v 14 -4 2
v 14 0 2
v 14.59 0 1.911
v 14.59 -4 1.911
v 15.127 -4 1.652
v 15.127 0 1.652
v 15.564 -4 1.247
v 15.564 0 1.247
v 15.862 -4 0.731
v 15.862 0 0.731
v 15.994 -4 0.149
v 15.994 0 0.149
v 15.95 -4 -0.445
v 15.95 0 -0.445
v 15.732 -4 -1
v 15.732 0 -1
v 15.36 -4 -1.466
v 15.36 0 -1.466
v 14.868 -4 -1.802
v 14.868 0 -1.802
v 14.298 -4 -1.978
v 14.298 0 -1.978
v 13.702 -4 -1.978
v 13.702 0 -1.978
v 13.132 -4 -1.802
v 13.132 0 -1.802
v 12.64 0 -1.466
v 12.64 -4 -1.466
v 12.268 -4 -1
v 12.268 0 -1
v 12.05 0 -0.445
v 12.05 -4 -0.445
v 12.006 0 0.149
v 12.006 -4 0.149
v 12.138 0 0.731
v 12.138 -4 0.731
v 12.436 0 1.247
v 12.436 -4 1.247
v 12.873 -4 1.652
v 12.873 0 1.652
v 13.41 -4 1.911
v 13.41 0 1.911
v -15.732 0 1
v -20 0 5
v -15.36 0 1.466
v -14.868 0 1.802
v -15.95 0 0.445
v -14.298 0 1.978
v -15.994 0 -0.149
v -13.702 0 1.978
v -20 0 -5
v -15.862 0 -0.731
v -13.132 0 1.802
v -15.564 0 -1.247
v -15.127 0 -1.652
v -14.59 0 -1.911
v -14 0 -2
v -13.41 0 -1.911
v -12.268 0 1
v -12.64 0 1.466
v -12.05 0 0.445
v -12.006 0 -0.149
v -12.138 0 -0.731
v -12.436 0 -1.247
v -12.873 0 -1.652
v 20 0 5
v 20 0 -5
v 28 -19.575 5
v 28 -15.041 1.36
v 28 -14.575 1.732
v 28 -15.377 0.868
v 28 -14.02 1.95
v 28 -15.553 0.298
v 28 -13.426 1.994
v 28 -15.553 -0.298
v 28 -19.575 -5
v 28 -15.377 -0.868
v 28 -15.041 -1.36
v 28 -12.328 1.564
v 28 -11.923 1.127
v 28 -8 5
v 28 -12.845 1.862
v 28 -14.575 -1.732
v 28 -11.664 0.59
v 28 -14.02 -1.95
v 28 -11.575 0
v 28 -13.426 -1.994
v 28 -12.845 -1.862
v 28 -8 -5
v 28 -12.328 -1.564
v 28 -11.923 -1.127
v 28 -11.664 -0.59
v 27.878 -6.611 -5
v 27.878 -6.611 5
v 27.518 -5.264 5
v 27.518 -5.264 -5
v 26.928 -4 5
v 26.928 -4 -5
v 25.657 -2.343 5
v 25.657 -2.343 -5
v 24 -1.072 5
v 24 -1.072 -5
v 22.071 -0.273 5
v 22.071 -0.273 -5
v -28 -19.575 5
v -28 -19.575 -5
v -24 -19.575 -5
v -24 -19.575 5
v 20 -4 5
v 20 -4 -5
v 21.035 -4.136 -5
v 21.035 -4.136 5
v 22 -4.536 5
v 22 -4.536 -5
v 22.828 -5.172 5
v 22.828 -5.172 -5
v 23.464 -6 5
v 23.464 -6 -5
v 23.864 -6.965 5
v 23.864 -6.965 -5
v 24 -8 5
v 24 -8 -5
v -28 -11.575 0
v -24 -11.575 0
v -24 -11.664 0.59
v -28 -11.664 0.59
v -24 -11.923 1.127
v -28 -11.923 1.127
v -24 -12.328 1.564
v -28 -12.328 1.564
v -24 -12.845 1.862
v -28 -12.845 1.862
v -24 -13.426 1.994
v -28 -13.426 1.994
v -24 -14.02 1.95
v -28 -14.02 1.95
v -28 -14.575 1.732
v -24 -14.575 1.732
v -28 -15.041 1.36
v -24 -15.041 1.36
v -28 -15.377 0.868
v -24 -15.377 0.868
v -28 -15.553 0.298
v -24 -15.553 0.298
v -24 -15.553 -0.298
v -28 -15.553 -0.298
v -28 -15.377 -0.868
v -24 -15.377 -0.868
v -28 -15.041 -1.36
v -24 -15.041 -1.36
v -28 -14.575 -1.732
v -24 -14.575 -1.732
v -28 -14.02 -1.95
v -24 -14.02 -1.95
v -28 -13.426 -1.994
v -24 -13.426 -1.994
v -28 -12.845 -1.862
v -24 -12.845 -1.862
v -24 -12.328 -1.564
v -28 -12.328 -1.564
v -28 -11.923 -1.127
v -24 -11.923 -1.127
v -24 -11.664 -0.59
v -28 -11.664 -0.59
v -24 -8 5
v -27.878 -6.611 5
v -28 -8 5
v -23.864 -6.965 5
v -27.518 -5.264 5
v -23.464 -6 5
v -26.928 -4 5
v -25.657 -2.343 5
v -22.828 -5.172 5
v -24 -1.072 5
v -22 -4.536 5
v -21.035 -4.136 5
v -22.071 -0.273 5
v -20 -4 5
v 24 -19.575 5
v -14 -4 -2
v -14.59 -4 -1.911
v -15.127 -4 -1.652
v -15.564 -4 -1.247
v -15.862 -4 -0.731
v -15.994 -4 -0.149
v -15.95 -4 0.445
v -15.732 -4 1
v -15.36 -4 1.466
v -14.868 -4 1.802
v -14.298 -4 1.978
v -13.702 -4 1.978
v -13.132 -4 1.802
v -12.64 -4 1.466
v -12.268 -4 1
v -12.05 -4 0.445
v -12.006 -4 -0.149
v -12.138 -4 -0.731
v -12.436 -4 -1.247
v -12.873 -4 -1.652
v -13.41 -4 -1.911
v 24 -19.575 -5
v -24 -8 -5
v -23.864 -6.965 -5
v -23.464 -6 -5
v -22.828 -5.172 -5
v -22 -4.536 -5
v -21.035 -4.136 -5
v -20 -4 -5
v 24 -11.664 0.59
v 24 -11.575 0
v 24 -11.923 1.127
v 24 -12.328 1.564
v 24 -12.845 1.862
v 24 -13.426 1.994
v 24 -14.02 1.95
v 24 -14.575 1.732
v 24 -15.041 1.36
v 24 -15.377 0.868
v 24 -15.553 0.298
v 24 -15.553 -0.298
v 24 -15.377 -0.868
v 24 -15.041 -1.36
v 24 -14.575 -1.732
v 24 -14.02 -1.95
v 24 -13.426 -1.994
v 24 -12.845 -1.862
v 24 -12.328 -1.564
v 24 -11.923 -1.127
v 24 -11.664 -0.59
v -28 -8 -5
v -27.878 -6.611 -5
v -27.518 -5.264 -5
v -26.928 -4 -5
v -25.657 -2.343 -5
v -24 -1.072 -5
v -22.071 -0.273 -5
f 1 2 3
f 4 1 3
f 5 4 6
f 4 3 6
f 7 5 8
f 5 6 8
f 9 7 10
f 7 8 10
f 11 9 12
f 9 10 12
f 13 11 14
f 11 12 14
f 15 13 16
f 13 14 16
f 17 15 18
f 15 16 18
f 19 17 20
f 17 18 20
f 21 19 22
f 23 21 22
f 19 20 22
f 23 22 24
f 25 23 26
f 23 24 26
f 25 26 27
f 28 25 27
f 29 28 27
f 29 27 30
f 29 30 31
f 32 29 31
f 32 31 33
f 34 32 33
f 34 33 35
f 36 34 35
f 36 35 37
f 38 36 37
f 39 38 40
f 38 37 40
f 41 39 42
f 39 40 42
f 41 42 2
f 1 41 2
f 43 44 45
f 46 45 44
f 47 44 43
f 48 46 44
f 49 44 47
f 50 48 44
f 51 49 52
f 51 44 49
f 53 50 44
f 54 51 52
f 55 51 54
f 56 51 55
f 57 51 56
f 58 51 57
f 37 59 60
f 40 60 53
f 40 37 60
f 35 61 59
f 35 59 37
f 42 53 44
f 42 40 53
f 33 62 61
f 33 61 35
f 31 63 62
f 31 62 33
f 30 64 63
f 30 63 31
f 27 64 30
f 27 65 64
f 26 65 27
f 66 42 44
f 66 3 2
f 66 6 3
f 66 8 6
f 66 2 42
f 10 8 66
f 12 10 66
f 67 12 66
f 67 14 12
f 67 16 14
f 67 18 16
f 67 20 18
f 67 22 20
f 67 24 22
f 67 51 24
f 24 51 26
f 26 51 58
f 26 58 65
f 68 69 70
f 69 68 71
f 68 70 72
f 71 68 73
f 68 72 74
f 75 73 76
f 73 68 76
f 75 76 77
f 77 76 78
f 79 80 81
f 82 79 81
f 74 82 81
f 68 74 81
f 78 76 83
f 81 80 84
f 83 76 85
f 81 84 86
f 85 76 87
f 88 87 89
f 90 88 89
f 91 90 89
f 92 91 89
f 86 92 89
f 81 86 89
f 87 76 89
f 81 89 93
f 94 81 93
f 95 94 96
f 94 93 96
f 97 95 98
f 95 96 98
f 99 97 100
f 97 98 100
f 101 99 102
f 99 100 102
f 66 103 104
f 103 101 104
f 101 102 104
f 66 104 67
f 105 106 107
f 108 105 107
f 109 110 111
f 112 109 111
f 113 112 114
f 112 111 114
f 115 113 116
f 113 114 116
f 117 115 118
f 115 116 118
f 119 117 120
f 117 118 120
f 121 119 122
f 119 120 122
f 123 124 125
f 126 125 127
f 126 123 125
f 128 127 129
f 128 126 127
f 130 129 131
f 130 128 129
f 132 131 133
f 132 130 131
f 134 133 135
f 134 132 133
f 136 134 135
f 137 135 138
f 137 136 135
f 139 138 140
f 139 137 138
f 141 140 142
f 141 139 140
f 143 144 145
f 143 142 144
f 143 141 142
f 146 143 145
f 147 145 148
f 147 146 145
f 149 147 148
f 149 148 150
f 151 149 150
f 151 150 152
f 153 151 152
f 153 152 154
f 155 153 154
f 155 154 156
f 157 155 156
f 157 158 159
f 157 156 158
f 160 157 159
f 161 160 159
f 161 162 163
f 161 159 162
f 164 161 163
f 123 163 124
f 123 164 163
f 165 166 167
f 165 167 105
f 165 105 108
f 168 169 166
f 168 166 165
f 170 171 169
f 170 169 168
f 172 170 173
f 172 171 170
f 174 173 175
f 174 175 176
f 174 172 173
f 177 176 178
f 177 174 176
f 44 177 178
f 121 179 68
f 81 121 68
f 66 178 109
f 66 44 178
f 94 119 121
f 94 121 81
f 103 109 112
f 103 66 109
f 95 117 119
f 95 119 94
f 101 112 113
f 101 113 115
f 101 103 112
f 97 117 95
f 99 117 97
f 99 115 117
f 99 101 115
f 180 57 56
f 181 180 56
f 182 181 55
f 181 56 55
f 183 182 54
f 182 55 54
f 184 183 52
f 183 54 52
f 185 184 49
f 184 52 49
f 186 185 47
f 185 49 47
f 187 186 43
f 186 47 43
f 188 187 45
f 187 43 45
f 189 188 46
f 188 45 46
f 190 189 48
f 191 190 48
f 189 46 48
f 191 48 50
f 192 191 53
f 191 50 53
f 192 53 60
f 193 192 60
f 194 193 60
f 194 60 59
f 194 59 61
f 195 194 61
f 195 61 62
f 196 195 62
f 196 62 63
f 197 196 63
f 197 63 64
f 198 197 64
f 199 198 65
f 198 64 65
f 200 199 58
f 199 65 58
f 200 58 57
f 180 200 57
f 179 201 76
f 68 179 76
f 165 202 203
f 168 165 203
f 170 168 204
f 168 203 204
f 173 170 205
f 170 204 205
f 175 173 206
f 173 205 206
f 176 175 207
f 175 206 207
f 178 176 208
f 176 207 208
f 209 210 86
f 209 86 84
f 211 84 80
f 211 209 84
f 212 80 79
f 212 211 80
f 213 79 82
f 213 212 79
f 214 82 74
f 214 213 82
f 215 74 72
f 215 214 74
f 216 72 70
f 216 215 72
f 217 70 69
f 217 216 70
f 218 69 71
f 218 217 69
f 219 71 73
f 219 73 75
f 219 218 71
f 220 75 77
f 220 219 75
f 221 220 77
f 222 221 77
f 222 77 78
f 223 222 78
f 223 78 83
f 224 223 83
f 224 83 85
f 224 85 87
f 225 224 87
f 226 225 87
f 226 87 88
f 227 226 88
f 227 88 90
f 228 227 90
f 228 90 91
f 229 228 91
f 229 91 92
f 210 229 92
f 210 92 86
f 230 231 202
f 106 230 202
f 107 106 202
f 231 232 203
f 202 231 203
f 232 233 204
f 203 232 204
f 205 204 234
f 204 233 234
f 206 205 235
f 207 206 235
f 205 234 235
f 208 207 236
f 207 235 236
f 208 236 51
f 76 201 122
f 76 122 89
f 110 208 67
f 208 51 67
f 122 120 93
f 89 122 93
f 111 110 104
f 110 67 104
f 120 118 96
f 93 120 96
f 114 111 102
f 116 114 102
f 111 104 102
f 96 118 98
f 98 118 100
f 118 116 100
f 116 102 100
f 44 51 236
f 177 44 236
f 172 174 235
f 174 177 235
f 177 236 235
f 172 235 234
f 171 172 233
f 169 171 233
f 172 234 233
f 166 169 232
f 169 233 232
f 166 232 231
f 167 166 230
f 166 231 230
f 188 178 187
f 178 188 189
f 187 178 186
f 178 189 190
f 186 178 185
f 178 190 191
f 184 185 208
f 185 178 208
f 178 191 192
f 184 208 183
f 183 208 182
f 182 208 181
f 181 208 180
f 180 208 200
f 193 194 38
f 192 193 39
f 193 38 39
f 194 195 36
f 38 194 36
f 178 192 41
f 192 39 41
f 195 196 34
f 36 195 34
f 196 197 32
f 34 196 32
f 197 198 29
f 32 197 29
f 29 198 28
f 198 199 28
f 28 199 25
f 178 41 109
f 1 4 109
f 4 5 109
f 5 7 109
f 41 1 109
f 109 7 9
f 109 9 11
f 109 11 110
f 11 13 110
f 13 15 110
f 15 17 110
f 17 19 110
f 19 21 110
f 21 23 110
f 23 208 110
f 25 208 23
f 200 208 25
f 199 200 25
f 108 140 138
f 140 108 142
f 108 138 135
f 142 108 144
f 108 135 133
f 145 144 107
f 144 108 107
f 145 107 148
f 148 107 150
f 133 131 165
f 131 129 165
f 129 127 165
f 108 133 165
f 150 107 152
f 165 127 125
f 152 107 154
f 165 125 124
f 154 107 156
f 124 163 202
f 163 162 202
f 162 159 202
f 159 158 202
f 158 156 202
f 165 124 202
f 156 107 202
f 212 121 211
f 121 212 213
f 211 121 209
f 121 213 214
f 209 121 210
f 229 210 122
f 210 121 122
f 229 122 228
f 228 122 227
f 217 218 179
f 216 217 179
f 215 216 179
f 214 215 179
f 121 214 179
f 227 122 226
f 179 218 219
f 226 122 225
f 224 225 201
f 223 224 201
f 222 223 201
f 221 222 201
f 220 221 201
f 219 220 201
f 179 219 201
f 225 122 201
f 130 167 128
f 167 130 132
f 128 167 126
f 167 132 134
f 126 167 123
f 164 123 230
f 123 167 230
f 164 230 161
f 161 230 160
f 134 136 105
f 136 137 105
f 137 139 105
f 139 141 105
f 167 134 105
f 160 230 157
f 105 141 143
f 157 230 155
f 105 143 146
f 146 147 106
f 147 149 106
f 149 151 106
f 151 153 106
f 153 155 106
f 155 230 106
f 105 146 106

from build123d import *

# Parameters (mm, degrees)
SKETCH1_W                  = 82
SKETCH1_H                  = 10
SKETCH1_R                  = 2
BASE_FLANGE1_DEPTH         = 4
SKETCHED_START             = -5
SKETCHED_BEND1_DEPTH       = 10
SKETCHED_BEND1_2_DEPTH     = 2.9999999
SKETCHED_START_2           = 2.0000001
SKETCHED_BEND1_3_DEPTH     = 2.9999999
SKETCHED_START_3           = -2.0000001
SKETCHED_BEND1_4_DEPTH     = 4.0000002
SKETCHED_START_4           = -28
SKETCHED_BEND1_5_OUTLINE_R = 2
SKETCHED_BEND1_5_DEPTH     = 56


with BuildPart() as part:
    # Base-Flange1: sheet metal written as solids
    # Sketch1 → Base-Flange1 (new body)
    with BuildSketch(Plane(origin=(0, 0, 0), x_dir=(1, 0, 0), z_dir=(0, 1, 0))):
        Rectangle(SKETCH1_W, SKETCH1_H)
        with Locations(Location((14, 0, 0), (0, 0, 270))):
            Circle(SKETCH1_R, mode=Mode.SUBTRACT)
        with Locations(Location((35, 0, 0), (0, 0, 270))):
            Circle(SKETCH1_R, mode=Mode.SUBTRACT)
        with Locations(Location((-35, 0, 0), (0, 0, 90))):
            Circle(SKETCH1_R, mode=Mode.SUBTRACT)
        with Locations(Location((-14, 0, 0), (0, 0, 90))):
            Circle(SKETCH1_R, mode=Mode.SUBTRACT)
    extrude(amount=-BASE_FLANGE1_DEPTH)

    # Sketched Bend1: read off the stored shape, not the designer's step
    # Sketched Bend1 outline → Sketched Bend1 (cut)
    with BuildSketch(Plane.XY.offset(SKETCHED_START)):
        with BuildLine():
            ThreePointArc((20, 0), (23.999999999, -1.07179677), (26.92820323, -4))
            Line((26.92820323, -4), (41, -4))
            Line((41, -4), (41, 0))
            Line((41, 0), (20, 0))
        make_face()
        with BuildLine():
            Line((-41, -4), (-26.92820323, -4))
            ThreePointArc((-26.92820323, -4), (-23.999999999, -1.07179677), (-20, 0))
            Line((-20, 0), (-41, 0))
            Line((-41, 0), (-41, -4))
        make_face()
    extrude(amount=SKETCHED_BEND1_DEPTH, mode=Mode.SUBTRACT)

    # Sketched Bend1 2 outline → Sketched Bend1 2 (add)
    with BuildSketch(Plane.XY.offset(SKETCHED_START)):
        with BuildLine():
            ThreePointArc((20, -4), (22.828427125, -5.171572875), (24, -8))
            Line((24, -8), (24, -19.575222039))
            Line((24, -19.575222039), (28, -19.575222039))
            Line((28, -19.575222039), (28, -8))
            ThreePointArc((28, -8), (27.72740661, -5.929447639), (26.92820323, -4))
            Line((26.92820323, -4), (20, -4))
        make_face()
        with BuildLine():
            ThreePointArc((-24, -8), (-22.828427125, -5.171572875), (-20, -4))
            Line((-20, -4), (-26.92820323, -4))
            ThreePointArc((-26.92820323, -4), (-27.72740661, -5.929447639), (-28, -8))
            Line((-28, -8), (-28, -19.575222039))
            Line((-28, -19.575222039), (-24, -19.575222039))
            Line((-24, -19.575222039), (-24, -8))
        make_face()
    extrude(amount=SKETCHED_BEND1_2_DEPTH)

    # Sketched Bend1 3 outline → Sketched Bend1 3 (add)
    with BuildSketch(Plane.XY.offset(SKETCHED_START_2)):
        with BuildLine():
            ThreePointArc((20, -4), (22.828427125, -5.171572875), (24, -8))
            Line((24, -8), (24, -19.575222039))
            Line((24, -19.575222039), (28, -19.575222039))
            Line((28, -19.575222039), (28, -8))
            ThreePointArc((28, -8), (27.72740661, -5.929447639), (26.92820323, -4))
            Line((26.92820323, -4), (20, -4))
        make_face()
        with BuildLine():
            ThreePointArc((-24, -8), (-22.828427125, -5.171572875), (-20, -4))
            Line((-20, -4), (-26.92820323, -4))
            ThreePointArc((-26.92820323, -4), (-27.72740661, -5.929447639), (-28, -8))
            Line((-28, -8), (-28, -19.575222039))
            Line((-28, -19.575222039), (-24, -19.575222039))
            Line((-24, -19.575222039), (-24, -8))
        make_face()
    extrude(amount=SKETCHED_BEND1_3_DEPTH)

    # Sketched Bend1 4 outline → Sketched Bend1 4 (add)
    with BuildSketch(Plane.XY.offset(SKETCHED_START_3)):
        with BuildLine():
            ThreePointArc((-24, -8), (-22.828427125, -5.171572875), (-20, -4))
            Line((-20, -4), (-26.92820323, -4))
            ThreePointArc((-26.92820323, -4), (-27.72740661, -5.929447639), (-28, -8))
            Line((-28, -8), (-28, -19.575222039))
            Line((-28, -19.575222039), (-24, -19.575222039))
            Line((-24, -19.575222039), (-24, -8))
        make_face()
        with BuildLine():
            ThreePointArc((20, -4), (22.828427125, -5.171572875), (24, -8))
            Line((24, -8), (24, -19.575222039))
            Line((24, -19.575222039), (28, -19.575222039))
            Line((28, -19.575222039), (28, -8))
            ThreePointArc((28, -8), (27.72740661, -5.929447639), (26.92820323, -4))
            Line((26.92820323, -4), (20, -4))
        make_face()
    extrude(amount=SKETCHED_BEND1_4_DEPTH)

    # Sketched Bend1 5 outline → Sketched Bend1 5 (cut)
    with BuildSketch(Plane.YZ.offset(SKETCHED_START_4)):
        with Locations((-13.575222039, 0)):
            Circle(SKETCHED_BEND1_5_OUTLINE_R)
    extrude(amount=SKETCHED_BEND1_5_DEPTH, mode=Mode.SUBTRACT)


solid = part.part
